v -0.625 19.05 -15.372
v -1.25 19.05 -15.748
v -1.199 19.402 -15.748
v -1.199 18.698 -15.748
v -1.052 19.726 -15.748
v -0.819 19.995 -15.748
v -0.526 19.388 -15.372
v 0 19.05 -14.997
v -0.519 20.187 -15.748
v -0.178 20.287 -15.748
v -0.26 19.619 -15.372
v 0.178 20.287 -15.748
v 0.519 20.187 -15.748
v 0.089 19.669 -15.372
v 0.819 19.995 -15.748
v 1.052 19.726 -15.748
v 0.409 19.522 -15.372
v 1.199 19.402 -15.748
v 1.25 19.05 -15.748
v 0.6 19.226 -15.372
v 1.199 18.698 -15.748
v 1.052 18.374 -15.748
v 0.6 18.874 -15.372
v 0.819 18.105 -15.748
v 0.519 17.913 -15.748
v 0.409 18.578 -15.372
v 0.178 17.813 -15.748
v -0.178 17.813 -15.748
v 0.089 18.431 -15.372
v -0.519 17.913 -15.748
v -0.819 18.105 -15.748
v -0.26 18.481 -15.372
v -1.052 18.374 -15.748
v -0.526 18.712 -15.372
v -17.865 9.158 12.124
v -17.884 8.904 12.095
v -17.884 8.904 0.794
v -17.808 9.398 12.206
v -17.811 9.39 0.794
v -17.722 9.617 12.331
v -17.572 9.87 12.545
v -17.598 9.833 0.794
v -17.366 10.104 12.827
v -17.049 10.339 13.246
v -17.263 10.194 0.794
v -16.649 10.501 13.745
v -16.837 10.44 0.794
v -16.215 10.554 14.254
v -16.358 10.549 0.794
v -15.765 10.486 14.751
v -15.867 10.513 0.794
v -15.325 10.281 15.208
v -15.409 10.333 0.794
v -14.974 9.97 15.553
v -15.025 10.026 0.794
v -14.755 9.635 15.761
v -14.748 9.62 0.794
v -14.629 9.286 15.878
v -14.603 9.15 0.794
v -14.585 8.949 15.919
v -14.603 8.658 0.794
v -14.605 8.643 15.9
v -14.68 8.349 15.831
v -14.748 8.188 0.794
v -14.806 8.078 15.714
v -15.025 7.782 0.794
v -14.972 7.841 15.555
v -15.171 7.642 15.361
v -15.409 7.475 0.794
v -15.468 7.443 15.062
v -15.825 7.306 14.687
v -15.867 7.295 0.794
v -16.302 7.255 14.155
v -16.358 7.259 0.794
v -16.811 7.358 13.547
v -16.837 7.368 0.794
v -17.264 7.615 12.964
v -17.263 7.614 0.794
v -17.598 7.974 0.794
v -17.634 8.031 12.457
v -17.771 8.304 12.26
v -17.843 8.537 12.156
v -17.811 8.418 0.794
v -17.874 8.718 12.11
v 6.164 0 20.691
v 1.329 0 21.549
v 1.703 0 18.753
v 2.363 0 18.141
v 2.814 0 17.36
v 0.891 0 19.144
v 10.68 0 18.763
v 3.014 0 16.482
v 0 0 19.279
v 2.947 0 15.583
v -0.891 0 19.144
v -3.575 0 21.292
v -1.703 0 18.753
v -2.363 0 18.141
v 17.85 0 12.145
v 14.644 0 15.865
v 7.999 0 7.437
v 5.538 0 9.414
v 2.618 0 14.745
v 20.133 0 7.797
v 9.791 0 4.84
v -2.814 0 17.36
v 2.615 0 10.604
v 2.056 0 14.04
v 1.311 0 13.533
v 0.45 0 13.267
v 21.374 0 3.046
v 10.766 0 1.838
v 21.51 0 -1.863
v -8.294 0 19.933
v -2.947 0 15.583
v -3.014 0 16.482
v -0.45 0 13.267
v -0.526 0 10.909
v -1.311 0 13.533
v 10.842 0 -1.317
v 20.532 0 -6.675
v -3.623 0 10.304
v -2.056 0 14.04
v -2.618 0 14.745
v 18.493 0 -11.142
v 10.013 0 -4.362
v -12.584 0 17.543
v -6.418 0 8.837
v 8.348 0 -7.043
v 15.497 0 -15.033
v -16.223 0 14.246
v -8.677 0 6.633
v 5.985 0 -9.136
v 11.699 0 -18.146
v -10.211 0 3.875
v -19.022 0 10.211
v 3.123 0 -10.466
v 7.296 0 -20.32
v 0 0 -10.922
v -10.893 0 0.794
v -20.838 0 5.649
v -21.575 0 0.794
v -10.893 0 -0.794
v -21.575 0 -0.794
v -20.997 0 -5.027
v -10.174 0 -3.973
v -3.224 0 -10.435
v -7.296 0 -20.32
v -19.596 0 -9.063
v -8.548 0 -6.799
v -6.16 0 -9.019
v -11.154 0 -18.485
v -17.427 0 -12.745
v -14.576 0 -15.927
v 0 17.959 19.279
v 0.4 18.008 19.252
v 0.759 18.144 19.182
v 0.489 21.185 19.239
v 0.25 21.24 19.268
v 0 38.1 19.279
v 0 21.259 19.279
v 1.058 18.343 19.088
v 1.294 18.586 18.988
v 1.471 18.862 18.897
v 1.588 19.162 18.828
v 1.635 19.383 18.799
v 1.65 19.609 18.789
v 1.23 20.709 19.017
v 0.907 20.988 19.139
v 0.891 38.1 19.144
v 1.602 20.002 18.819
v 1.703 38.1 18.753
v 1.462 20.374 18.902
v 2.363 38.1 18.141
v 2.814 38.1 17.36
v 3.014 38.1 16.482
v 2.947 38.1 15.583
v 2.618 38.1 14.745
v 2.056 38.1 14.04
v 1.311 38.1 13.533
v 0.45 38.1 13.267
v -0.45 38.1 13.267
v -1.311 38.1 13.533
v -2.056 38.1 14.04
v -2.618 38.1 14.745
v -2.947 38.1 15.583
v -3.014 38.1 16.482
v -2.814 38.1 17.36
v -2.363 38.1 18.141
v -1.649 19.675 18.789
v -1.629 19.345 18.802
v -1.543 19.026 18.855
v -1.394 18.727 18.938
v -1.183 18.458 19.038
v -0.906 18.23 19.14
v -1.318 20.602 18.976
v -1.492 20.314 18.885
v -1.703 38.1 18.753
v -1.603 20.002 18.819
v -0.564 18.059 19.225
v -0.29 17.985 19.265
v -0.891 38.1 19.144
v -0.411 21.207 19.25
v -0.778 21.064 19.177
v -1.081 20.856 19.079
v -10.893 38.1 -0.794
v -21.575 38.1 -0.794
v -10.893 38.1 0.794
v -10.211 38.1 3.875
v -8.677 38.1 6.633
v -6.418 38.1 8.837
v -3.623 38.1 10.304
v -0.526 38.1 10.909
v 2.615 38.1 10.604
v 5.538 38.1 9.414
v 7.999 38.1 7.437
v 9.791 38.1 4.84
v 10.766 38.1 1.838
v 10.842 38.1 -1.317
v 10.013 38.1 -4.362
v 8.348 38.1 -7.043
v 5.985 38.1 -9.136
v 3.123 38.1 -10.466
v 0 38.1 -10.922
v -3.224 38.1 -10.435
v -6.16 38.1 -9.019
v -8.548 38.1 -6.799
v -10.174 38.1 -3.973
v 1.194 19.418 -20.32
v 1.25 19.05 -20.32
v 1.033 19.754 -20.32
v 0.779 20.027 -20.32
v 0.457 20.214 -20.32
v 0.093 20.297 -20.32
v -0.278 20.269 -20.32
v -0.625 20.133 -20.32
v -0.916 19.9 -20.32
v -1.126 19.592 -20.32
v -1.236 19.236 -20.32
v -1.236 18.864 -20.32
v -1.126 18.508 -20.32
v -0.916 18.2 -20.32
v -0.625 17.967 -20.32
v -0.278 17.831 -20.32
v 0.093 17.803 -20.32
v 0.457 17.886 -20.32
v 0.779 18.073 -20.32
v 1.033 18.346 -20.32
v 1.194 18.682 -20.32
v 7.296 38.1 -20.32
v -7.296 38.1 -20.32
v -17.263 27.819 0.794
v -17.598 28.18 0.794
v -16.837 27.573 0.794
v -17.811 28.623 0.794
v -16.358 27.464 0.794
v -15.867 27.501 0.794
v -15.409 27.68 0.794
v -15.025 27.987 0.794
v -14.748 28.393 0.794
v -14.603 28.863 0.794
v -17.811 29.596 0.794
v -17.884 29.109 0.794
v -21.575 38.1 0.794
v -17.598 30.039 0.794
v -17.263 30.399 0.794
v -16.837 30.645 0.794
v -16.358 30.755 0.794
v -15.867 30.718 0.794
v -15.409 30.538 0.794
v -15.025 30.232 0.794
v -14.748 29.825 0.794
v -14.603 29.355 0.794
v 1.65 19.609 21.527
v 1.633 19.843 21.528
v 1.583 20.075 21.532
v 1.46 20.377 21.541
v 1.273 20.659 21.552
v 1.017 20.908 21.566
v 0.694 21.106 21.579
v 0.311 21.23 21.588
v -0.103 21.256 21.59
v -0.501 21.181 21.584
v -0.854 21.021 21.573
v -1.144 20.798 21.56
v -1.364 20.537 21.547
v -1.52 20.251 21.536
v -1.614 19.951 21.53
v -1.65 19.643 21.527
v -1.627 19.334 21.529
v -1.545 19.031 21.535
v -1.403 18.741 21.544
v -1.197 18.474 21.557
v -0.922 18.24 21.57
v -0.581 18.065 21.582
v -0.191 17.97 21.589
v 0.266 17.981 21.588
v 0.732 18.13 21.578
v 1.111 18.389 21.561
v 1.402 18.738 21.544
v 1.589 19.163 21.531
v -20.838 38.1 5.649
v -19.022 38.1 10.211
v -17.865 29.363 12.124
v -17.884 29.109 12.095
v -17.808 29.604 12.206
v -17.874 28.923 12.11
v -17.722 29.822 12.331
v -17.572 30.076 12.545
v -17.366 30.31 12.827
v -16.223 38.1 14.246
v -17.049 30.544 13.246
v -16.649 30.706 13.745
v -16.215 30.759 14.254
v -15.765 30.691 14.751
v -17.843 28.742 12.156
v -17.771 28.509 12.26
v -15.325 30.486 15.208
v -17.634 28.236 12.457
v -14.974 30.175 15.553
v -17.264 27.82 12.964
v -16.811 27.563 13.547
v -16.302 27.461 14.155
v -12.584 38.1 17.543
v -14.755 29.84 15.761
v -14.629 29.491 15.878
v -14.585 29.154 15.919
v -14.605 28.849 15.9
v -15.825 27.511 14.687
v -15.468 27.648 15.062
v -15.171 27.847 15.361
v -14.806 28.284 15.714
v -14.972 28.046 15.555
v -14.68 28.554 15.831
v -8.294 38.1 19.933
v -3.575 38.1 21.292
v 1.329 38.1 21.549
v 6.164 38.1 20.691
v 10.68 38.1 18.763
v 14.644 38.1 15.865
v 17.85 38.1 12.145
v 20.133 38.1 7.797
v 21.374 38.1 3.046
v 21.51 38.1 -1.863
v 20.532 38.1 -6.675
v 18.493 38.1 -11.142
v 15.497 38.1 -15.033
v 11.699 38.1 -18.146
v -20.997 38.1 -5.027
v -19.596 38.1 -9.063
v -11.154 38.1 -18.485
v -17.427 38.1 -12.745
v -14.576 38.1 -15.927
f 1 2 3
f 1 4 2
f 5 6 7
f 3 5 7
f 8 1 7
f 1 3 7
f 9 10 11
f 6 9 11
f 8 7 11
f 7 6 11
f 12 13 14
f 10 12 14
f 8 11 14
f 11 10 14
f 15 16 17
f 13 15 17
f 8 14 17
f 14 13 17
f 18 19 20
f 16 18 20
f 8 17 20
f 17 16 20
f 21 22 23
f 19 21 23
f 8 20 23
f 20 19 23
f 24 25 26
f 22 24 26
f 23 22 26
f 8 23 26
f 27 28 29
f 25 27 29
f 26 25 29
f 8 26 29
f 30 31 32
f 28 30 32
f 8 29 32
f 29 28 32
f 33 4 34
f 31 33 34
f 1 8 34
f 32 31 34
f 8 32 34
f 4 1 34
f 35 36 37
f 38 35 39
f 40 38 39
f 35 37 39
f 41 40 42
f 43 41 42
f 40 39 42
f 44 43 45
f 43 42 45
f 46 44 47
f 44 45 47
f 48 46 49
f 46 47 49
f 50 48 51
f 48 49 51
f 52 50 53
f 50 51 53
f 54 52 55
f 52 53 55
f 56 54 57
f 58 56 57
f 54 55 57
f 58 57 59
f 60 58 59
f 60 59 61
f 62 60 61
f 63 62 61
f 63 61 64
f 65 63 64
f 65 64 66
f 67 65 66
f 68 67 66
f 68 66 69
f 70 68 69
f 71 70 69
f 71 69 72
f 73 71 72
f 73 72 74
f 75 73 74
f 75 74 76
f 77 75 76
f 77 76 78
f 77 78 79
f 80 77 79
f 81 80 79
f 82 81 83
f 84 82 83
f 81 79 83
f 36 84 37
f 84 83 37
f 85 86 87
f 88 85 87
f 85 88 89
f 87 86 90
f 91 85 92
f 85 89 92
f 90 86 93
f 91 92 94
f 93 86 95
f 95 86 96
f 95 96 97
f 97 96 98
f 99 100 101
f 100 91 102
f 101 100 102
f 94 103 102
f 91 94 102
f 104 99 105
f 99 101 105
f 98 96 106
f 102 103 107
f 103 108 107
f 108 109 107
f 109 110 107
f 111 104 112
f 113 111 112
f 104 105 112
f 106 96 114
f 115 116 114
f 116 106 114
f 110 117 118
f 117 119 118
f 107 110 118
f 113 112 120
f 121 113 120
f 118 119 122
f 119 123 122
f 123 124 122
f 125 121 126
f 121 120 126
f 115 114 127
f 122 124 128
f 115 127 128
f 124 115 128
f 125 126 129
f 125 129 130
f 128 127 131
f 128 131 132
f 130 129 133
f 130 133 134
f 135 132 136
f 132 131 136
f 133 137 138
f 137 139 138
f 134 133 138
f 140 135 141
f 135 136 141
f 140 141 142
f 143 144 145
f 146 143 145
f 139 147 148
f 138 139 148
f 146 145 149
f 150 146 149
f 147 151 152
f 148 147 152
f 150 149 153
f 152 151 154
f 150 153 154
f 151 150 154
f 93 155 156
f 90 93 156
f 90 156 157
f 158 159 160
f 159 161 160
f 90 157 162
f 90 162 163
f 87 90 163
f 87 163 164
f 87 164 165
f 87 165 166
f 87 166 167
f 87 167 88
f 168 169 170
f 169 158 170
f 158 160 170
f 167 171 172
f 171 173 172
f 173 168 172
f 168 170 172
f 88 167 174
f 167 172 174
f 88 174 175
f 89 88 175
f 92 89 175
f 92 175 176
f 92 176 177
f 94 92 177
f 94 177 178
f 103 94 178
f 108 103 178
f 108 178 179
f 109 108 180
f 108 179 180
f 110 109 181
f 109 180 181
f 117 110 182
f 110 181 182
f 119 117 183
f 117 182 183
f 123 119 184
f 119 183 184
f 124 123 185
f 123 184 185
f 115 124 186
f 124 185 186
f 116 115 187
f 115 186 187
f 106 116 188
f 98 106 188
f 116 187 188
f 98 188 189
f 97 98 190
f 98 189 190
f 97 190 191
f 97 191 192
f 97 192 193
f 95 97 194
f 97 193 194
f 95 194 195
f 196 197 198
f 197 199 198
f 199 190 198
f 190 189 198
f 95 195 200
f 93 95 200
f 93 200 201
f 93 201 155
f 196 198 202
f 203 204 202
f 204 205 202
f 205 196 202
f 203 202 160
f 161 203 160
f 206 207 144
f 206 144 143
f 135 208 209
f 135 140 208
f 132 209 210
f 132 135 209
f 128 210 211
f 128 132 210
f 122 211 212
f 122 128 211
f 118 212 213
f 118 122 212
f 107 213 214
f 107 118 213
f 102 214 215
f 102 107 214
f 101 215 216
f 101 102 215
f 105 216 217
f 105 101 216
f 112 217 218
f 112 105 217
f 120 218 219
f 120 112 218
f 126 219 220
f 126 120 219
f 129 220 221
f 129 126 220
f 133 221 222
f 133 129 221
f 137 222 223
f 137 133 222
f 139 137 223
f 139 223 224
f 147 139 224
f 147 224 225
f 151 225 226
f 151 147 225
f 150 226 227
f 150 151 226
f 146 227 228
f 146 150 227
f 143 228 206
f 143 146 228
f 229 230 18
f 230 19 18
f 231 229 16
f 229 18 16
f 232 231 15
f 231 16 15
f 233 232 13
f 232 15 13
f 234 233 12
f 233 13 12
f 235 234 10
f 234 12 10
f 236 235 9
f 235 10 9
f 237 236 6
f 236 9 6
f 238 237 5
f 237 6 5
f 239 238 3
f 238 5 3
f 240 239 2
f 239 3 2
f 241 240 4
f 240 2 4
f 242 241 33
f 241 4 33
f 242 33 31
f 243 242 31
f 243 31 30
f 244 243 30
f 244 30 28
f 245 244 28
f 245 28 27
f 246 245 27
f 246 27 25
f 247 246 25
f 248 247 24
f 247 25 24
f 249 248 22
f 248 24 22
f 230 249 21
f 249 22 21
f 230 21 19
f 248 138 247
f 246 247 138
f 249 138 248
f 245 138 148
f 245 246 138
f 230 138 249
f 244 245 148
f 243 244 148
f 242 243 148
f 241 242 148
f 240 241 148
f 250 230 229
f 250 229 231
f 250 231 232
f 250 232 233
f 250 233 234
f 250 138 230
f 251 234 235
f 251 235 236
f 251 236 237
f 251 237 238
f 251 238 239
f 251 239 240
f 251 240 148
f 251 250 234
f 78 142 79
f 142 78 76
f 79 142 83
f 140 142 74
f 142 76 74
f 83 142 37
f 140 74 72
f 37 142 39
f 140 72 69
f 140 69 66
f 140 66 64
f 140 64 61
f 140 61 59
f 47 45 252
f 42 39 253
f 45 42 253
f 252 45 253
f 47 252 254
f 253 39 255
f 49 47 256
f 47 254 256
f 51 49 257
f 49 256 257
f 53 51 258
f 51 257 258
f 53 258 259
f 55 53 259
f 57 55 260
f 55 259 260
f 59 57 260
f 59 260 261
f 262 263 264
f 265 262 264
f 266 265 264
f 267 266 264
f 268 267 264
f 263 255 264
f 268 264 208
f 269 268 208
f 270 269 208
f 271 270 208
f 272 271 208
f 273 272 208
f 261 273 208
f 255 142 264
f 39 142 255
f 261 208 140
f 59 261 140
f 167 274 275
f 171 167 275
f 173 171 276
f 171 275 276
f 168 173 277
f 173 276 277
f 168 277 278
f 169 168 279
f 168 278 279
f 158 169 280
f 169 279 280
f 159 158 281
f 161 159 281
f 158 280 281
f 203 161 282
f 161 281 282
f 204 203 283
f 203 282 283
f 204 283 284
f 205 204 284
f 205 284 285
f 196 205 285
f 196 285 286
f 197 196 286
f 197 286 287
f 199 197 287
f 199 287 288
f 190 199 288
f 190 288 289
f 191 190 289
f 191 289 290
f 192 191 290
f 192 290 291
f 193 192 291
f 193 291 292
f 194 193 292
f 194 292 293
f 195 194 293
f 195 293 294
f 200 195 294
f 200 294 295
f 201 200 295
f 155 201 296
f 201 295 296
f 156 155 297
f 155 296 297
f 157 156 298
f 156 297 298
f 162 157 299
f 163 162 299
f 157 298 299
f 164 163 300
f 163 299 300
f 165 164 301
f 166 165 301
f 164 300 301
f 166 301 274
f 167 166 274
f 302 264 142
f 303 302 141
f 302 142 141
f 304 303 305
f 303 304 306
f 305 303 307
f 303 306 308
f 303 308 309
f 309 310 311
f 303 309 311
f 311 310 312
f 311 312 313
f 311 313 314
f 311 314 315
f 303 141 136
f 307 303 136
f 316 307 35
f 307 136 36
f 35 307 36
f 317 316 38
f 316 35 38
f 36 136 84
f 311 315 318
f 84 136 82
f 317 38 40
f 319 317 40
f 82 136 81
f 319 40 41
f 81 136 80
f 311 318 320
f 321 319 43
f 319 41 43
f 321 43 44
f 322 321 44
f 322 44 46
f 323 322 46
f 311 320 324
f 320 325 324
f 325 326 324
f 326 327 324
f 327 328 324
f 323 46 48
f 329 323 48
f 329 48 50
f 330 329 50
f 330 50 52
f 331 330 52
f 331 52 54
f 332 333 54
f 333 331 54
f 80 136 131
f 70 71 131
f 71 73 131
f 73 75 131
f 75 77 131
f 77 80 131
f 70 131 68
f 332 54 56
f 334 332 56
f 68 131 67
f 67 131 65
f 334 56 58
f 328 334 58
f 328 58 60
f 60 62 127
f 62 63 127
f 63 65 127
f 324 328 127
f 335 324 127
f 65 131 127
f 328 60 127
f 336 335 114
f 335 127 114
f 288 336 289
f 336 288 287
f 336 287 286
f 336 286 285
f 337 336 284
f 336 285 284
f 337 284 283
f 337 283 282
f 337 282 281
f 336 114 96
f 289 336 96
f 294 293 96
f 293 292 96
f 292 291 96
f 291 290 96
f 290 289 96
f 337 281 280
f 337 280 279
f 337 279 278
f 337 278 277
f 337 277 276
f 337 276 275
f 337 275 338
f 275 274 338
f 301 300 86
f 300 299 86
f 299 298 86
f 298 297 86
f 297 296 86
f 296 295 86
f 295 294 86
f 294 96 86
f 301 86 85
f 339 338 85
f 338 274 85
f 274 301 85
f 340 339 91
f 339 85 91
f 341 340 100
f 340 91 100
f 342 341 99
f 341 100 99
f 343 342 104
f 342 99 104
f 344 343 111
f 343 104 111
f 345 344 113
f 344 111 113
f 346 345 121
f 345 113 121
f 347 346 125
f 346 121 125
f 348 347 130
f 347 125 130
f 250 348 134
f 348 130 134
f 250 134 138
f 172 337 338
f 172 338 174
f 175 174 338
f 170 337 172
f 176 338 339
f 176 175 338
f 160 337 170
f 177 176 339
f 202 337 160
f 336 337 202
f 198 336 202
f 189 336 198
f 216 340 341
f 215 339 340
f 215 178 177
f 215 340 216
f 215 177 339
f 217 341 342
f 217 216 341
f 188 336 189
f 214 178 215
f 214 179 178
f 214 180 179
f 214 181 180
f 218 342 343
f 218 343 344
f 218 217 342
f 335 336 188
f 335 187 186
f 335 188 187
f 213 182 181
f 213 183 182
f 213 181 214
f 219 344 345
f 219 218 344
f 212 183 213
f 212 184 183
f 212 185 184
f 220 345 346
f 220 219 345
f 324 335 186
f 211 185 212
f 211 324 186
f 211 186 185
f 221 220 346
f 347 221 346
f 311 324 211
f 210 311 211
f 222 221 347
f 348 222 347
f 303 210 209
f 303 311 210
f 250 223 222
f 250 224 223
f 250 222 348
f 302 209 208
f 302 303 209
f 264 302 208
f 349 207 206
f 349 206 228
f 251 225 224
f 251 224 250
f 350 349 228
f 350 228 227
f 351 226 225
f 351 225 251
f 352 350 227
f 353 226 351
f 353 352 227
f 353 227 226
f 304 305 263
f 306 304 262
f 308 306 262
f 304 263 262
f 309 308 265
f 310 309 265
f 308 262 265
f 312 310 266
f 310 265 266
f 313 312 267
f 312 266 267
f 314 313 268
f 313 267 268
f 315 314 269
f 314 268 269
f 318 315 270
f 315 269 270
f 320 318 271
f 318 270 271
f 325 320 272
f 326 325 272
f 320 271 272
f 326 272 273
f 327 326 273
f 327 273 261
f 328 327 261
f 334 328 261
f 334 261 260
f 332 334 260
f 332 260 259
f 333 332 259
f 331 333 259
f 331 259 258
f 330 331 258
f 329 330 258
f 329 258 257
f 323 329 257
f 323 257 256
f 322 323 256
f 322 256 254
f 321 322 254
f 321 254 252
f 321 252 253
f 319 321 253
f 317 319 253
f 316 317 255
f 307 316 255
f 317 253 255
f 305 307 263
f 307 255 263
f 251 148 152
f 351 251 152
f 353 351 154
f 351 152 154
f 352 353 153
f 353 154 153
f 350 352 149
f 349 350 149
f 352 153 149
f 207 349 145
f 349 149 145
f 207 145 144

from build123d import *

# Parameters (mm, degrees)
SKETCH2_R                        = 21.59
SKETCH2_R_2                      = 10.922
BOSS_EXTRUDE1_DEPTH              = 38.1
CUT_EXTRUDE1_REACH               = 50.825
SKETCH3_W                        = 21.59
SKETCH3_H                        = 1.5875
CUT_EXTRUDE2_REACH               = 50.825
SKETCH4_R                        = 3.0226
CUT_EXTRUDE3_REACH               = 50.825
TAP_DRILL_FOR_M3X0_5_TAP1_D      = 2.5
TAP_DRILL_FOR_M3X0_5_TAP1_DEPTH  = 4.572
TAP_DRILL_FOR_M3X0_5_TAP1_TIP    = 0.751075774
CUT_EXTRUDE4_REACH               = 62.615
CUT_EXTRUDE4_END_RADIUS          = 3.0226
SKETCH8_R                        = 1.650000002
TAP_DRILL_FOR_M4X0_7_TAP1_REACH  = 54.19
TAP_DRILL_FOR_M4X0_7_TAP1_BORE_R = 1.65


with BuildPart() as part:
    # Sketch2 → Boss-Extrude1 (new body)
    with BuildSketch(Plane(origin=(0, 0, 0), x_dir=(1, 0, 0), z_dir=(0, 1, 0))):
        with Locations(Location((0, 0, 0), (0, 0, 90))):
            Circle(SKETCH2_R)
        with Locations(Location((0, 0, 0), (0, 0, 90))):
            Circle(SKETCH2_R_2, mode=Mode.SUBTRACT)
    extrude(amount=BOSS_EXTRUDE1_DEPTH)

    # Sketch3 → Cut-Extrude1 (cut, up to next)
    with BuildSketch(Plane(origin=(0, 38.1, 0), x_dir=(1, 0, 0), z_dir=(0, 1, 0)), mode=Mode.PRIVATE) as cut_extrude1_sk1:
        with Locations((-10.795, 0)):
            Rectangle(SKETCH3_W, SKETCH3_H)
    cut_extrude1_tool1 = extrude(cut_extrude1_sk1.sketch, amount=-CUT_EXTRUDE1_REACH, mode=Mode.PRIVATE) & part.part
    add(cut_extrude1_tool1.solids().sort_by_distance((-10.795, 38.1, 0))[0], mode=Mode.SUBTRACT)

    # Sketch4 → Cut-Extrude2 (cut, up to next)
    with BuildSketch(Plane(origin=(0, 38.1, 0), x_dir=(1, 0, 0), z_dir=(0, 1, 0)), mode=Mode.PRIVATE) as cut_extrude2_sk1:
        with Locations(Location((0, -16.256, 0), (0, 0, 270))):
            Circle(SKETCH4_R)
    cut_extrude2_tool1 = extrude(cut_extrude2_sk1.sketch, amount=-CUT_EXTRUDE2_REACH, mode=Mode.PRIVATE) & part.part
    add(cut_extrude2_tool1.solids().sort_by_distance((0, 38.1, 16.256))[0], mode=Mode.SUBTRACT)

    # Sketch5 → Cut-Extrude3 (cut, up to next)
    with BuildSketch(Plane(origin=(0, 38.1, 0), x_dir=(1, 0, 0), z_dir=(0, 1, 0)), mode=Mode.PRIVATE) as cut_extrude3_sk1:
        with BuildLine():
            Line((7.295594561, 20.32), (-7.295594561, 20.32))
            ThreePointArc((-7.295594561, 20.32), (0, 21.59), (7.295594561, 20.32))
        make_face()
    cut_extrude3_tool1 = extrude(cut_extrude3_sk1.sketch, amount=-CUT_EXTRUDE3_REACH, mode=Mode.PRIVATE) & part.part
    add(cut_extrude3_tool1.solids().sort_by_distance((0, 38.1, -20.829303))[0], mode=Mode.SUBTRACT)

    # Tap Drill for M3x0.5 Tap1
    with Locations(Plane(origin=(0, 19.05, -20.32), x_dir=(-1, 0, 0), z_dir=(0, 0, -1))):
        with Locations((0, 0)):
            Hole(TAP_DRILL_FOR_M3X0_5_TAP1_D / 2, depth=TAP_DRILL_FOR_M3X0_5_TAP1_DEPTH)
            with Locations((0, 0, -(TAP_DRILL_FOR_M3X0_5_TAP1_DEPTH + TAP_DRILL_FOR_M3X0_5_TAP1_TIP / 2))):  # 118° drill point
                Cone(0, TAP_DRILL_FOR_M3X0_5_TAP1_D / 2, TAP_DRILL_FOR_M3X0_5_TAP1_TIP, mode=Mode.SUBTRACT)

    # Cut-Extrude4: up to this cylinder (the profile starts outside it)
    cut_extrude4_end = Plane(origin=(0, 19.609114, 16.256), z_dir=(0, 1, 0)) * Cylinder(CUT_EXTRUDE4_END_RADIUS, 132.2752, mode=Mode.PRIVATE)
    # Sketch8 → Cut-Extrude4 (cut, up to the surface)
    with BuildSketch(Plane.XY.offset(21.59), mode=Mode.PRIVATE) as cut_extrude4_sk1:
        with Locations((0, 19.609113622)):
            Circle(SKETCH8_R)
    cut_extrude4_tool1 = extrude(cut_extrude4_sk1.sketch, amount=-CUT_EXTRUDE4_REACH, mode=Mode.PRIVATE) - cut_extrude4_end
    add(cut_extrude4_tool1.solids().sort_by_distance((0, 19.609114, 21.59))[0], mode=Mode.SUBTRACT)

    # Tap Drill for M4x0.7 Tap1 bore (on position points) → Tap Drill for M4x0.7 Tap1 (cut, up to next)
    with BuildSketch(Plane(origin=(-16.234261615, 29.109235595, 0.79375), x_dir=(-1, 0, 0), z_dir=(0, 0, -1)), mode=Mode.PRIVATE) as tap_drill_for_m4x0_7_tap1_sk1:
        Circle(TAP_DRILL_FOR_M4X0_7_TAP1_BORE_R)
    tap_drill_for_m4x0_7_tap1_tool1 = extrude(tap_drill_for_m4x0_7_tap1_sk1.sketch, amount=-TAP_DRILL_FOR_M4X0_7_TAP1_REACH, mode=Mode.PRIVATE) & part.part
    # Tap Drill for M4x0.7 Tap1 bore (on position points) → Tap Drill for M4x0.7 Tap1 (cut, up to next)
    with BuildSketch(Plane(origin=(-16.234261615, 29.109235595, 0.79375), x_dir=(-1, 0, 0), z_dir=(0, 0, -1)), mode=Mode.PRIVATE) as tap_drill_for_m4x0_7_tap1_sk2:
        with Locations((0, -20.205281104)):
            Circle(TAP_DRILL_FOR_M4X0_7_TAP1_BORE_R)
    tap_drill_for_m4x0_7_tap1_tool2 = extrude(tap_drill_for_m4x0_7_tap1_sk2.sketch, amount=-TAP_DRILL_FOR_M4X0_7_TAP1_REACH, mode=Mode.PRIVATE) & part.part
    add(tap_drill_for_m4x0_7_tap1_tool1.solids().sort_by_distance((-16.234262, 29.109236, 0.79375))[0], mode=Mode.SUBTRACT)
    add(tap_drill_for_m4x0_7_tap1_tool2.solids().sort_by_distance((-16.234262, 8.903954, 0.79375))[0], mode=Mode.SUBTRACT)


solid = part.part
